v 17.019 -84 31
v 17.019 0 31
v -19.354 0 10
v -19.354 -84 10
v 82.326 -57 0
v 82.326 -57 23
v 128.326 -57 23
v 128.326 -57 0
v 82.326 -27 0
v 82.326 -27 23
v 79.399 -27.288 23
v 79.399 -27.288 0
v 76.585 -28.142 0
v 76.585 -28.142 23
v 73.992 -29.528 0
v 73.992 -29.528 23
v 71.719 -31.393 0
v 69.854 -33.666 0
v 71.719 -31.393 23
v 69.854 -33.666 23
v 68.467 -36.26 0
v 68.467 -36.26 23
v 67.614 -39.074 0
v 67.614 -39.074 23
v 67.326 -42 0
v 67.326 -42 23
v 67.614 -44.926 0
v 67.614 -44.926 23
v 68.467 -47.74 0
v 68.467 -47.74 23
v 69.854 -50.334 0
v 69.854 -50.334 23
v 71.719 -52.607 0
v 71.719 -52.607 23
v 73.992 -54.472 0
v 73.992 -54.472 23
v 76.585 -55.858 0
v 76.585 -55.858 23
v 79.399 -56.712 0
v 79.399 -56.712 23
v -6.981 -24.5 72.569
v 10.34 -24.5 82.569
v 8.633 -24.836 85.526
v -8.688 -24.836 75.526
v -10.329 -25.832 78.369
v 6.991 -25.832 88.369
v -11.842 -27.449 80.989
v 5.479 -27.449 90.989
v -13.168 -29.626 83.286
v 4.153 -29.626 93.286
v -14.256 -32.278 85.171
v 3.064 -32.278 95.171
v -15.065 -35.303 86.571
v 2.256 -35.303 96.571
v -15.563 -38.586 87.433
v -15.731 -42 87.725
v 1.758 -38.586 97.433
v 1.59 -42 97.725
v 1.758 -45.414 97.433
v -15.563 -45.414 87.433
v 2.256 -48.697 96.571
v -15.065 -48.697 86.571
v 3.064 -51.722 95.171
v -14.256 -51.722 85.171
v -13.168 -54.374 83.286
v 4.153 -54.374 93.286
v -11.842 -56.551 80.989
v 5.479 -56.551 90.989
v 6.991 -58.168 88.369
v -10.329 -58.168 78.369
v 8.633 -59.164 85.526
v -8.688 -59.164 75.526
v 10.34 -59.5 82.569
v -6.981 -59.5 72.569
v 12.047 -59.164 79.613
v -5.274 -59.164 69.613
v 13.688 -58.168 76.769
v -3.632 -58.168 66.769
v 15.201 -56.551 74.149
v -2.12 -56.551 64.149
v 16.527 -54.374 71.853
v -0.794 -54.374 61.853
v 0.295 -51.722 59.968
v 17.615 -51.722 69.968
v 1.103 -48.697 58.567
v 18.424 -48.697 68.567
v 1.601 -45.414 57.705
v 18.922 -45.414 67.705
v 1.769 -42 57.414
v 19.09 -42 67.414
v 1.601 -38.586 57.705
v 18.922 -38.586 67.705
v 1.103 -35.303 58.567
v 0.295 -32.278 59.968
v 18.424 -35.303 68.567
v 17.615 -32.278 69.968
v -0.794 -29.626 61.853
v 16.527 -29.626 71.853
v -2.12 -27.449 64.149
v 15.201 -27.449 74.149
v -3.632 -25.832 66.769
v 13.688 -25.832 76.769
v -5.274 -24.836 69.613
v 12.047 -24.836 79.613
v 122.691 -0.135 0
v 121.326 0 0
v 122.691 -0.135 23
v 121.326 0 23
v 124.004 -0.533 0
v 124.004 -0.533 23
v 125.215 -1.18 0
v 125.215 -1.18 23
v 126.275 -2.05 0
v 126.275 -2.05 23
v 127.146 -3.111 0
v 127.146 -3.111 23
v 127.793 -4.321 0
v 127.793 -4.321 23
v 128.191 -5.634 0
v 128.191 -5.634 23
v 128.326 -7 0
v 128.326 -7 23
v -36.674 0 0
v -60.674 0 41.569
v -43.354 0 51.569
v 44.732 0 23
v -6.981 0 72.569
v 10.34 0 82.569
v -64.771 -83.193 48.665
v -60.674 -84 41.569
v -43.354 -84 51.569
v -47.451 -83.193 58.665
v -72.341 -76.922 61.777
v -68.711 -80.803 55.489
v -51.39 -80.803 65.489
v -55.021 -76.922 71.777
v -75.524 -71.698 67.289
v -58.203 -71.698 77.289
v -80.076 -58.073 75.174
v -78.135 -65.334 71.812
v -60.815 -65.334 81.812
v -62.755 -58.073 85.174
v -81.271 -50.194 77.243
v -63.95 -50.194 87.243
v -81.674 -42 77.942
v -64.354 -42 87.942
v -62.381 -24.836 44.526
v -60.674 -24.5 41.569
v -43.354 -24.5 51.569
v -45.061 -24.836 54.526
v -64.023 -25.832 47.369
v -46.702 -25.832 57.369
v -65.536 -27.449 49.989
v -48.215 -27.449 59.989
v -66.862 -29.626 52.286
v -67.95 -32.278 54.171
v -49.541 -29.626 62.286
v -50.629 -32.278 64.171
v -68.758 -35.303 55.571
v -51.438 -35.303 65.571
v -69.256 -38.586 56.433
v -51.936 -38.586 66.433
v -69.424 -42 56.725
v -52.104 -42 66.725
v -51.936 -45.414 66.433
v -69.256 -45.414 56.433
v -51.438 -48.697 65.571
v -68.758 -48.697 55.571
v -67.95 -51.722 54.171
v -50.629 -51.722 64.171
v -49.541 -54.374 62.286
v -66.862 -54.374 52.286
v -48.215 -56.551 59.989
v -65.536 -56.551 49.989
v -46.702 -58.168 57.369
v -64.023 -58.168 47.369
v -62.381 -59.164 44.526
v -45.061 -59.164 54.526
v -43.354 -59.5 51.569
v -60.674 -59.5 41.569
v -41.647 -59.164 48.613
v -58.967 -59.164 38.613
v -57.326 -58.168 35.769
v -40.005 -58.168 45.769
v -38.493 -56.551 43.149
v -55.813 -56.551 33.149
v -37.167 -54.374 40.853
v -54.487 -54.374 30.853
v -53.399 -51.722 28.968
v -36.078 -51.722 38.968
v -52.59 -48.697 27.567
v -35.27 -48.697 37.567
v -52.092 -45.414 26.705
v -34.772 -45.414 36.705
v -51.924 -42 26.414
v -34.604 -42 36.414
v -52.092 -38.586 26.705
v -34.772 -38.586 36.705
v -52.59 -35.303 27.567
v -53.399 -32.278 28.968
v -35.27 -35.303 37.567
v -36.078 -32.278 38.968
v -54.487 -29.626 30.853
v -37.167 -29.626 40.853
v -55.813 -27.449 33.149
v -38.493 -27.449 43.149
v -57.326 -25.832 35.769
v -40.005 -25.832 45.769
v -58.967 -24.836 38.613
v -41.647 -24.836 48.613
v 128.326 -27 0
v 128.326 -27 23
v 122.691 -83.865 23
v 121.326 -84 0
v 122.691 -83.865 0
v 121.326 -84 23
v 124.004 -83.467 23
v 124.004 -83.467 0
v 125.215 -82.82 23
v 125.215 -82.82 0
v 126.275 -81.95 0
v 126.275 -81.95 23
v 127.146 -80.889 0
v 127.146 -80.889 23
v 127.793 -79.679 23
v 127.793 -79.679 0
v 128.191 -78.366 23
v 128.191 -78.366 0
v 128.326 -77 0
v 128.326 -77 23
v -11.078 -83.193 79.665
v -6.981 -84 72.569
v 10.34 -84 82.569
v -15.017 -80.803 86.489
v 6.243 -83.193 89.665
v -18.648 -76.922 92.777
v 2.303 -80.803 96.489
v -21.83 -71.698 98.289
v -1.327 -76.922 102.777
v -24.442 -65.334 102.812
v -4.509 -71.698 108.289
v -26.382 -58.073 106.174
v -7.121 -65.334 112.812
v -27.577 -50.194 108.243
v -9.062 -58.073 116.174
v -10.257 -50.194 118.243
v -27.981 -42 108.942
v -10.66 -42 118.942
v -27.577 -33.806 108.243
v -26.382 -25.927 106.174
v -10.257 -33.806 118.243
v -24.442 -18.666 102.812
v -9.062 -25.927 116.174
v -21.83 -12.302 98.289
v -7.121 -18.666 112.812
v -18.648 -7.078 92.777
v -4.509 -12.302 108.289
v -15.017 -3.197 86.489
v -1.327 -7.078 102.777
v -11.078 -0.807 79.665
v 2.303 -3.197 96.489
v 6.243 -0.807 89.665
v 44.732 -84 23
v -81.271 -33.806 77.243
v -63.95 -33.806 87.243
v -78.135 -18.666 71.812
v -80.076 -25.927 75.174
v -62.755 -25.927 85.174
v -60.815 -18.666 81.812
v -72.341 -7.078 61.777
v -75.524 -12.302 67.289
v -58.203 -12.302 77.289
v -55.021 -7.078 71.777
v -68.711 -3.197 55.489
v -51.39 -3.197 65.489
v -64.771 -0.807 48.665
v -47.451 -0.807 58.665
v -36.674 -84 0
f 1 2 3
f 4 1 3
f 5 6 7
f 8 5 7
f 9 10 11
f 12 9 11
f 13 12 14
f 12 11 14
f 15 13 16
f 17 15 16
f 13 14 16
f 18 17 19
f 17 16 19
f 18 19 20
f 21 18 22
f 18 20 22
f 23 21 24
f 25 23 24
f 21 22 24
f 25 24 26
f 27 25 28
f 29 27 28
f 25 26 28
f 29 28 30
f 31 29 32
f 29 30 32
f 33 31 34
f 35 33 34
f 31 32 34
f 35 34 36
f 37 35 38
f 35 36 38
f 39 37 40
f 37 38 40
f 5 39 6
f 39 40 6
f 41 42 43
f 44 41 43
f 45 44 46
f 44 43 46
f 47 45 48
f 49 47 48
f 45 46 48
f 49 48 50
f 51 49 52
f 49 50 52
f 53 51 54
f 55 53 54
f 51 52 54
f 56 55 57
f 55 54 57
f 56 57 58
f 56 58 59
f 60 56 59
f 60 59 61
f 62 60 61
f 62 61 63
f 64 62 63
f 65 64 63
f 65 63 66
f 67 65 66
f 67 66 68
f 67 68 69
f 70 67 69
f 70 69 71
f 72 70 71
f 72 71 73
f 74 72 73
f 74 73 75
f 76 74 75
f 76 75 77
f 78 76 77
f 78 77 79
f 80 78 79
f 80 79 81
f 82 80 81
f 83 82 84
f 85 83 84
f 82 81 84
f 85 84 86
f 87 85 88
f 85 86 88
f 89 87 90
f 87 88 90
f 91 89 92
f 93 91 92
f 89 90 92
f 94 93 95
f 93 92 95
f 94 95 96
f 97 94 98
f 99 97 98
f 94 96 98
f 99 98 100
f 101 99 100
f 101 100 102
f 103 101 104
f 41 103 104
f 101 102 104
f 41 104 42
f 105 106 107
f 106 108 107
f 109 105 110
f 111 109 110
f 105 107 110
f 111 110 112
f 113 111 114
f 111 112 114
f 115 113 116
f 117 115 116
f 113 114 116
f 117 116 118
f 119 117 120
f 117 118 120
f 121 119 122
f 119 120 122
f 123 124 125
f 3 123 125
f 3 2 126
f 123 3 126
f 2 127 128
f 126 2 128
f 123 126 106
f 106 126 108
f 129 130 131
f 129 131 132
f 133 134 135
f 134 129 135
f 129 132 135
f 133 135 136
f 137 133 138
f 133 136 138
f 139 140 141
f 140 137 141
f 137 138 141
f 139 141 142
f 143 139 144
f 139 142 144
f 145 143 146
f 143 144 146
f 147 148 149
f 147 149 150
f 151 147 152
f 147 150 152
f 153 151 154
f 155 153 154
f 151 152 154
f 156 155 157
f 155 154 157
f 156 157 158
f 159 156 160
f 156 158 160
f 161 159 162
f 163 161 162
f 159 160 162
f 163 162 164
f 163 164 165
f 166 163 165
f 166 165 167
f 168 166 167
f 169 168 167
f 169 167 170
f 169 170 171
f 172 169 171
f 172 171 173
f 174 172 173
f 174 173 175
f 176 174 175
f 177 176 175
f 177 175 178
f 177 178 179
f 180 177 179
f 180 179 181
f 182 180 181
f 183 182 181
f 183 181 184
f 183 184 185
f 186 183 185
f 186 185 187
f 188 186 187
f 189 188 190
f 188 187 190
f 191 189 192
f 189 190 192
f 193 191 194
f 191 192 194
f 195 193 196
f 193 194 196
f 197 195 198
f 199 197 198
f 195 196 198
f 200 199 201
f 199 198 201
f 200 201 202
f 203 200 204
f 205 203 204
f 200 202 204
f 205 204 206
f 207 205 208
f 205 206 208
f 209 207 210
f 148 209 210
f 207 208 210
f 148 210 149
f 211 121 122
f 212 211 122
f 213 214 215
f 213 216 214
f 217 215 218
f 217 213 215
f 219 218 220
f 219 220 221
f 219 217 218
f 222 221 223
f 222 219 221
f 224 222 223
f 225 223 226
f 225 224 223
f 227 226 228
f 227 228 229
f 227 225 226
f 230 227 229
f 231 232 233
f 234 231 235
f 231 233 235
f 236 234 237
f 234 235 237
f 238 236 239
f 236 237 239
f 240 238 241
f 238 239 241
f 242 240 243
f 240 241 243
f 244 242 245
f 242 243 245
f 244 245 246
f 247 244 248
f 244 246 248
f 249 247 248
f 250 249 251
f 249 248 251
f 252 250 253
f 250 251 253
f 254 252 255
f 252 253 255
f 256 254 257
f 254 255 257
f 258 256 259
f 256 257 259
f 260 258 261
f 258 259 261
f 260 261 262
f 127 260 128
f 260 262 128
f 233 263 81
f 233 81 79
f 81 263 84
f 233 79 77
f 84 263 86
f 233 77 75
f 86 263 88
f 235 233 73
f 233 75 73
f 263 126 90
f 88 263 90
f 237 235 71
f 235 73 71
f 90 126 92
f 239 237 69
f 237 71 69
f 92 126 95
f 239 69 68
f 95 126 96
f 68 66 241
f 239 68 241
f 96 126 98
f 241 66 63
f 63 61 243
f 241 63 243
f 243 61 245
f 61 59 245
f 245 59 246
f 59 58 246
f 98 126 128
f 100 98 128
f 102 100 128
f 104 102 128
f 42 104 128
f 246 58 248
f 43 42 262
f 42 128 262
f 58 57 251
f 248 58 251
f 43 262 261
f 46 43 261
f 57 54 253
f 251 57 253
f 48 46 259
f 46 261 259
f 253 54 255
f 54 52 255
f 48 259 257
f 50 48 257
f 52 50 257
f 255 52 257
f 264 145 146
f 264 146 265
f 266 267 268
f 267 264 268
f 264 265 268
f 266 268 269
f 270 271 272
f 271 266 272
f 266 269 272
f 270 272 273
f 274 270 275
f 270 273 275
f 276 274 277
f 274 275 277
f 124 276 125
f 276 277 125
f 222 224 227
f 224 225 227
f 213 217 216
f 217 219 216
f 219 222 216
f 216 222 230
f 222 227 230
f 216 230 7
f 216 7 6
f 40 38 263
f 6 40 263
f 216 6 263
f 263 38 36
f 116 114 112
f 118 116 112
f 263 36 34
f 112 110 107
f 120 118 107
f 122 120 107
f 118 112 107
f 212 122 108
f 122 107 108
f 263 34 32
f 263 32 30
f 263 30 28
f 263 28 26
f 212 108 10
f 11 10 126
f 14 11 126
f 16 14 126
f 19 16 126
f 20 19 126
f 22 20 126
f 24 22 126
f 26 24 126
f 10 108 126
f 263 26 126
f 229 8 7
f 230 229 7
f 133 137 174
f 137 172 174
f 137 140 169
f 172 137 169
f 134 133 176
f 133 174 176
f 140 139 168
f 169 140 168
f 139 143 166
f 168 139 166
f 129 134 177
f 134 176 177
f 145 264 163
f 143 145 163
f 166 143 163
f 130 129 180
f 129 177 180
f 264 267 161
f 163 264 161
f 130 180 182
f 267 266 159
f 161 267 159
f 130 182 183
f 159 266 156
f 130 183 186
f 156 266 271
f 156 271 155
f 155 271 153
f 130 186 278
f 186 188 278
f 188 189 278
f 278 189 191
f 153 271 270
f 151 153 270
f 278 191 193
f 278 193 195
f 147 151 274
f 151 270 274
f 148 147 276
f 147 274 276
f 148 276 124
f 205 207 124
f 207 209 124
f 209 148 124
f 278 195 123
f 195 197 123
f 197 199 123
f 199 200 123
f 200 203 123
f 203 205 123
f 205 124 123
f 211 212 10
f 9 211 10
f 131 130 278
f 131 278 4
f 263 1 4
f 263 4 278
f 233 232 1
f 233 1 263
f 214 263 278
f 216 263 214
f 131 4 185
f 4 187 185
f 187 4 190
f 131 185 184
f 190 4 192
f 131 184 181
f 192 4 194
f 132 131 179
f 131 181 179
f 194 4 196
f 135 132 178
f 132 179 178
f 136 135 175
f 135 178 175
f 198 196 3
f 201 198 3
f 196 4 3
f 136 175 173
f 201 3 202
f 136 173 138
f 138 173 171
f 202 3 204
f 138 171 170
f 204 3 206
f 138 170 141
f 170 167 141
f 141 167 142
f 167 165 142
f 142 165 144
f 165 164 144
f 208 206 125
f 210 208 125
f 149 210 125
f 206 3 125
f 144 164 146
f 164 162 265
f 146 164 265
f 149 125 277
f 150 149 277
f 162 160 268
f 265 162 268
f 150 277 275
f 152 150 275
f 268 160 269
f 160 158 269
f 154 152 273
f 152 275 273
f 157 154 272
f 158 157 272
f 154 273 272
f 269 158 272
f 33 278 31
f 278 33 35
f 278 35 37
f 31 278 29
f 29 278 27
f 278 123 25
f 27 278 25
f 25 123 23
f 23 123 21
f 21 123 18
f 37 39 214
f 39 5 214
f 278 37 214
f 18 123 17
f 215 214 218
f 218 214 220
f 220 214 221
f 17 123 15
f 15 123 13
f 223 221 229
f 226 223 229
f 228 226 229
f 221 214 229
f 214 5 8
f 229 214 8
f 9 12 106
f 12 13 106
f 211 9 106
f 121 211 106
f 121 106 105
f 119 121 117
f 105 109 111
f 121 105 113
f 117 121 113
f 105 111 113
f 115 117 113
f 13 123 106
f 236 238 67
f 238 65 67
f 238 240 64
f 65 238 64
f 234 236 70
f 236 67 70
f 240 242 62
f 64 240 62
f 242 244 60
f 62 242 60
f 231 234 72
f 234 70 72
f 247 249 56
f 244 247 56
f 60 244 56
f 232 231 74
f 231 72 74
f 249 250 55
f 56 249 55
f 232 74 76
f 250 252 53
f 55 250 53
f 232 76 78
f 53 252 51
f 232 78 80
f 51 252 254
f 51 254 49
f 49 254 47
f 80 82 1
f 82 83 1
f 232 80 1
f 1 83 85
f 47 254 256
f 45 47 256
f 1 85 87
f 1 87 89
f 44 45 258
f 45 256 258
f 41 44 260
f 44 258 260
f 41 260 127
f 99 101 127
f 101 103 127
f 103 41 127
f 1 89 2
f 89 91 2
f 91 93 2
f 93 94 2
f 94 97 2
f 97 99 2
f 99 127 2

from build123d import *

# Parameters (mm, degrees)
F1_DEPTH = 84
F3_DEPTH = 25
F4_R     = 7
F5_R     = 17.5
F6_DEPTH = 100


with BuildPart() as f1:
    # F0 (on Front) → F1 (new body)
    with BuildSketch(Plane.XZ):
        Polygon((-81.6743281484, 77.9422863406), (-36.6743281484, 0), (128.3256718516, 0), (128.3256718516, 23), (82.3256718516, 23), (44.7320598074, 23), (34.339754962, 41), (-10.660245038, 118.9422863406), (-27.9807531137, 108.9422863406), (17.0192468863, 31), (-19.3538200727, 10), (-64.3538200727, 87.9422863406), align=None)
    extrude(amount=F1_DEPTH)

    # F2 (on face) → F3 (cut)
    with BuildSketch(Plane.XY.offset(23)):
        with BuildLine():
            Line((128.3256718516, -27), (82.3256718516, -27))
            ThreePointArc((82.3256718516, -27), (67.3256718516, -42), (82.3256718516, -57))
            Line((82.3256718516, -57), (128.3256718516, -57))
            Line((128.3256718516, -57), (128.3256718516, -27))
        make_face()
    extrude(amount=-F3_DEPTH, mode=Mode.SUBTRACT)

    # F4
    f4_edges = [f1.edges().sort_by_distance(p)[0] for p in [
        (128.325672, 0, 11.5),
        (128.325672, -84, 11.5),
    ]]
    fillet(f4_edges, radius=F4_R)

    # F5 (on face) → F6 (cut)
    with BuildSketch(Plane(origin=(43.5083369991, 0, 25.1195500784), x_dir=(0, 1, 0), z_dir=(0.8660254038, 0, 0.5))):
        with Locations((-42, 66.3371640742)):
            Circle(F5_R)
        with BuildLine():
            ThreePointArc((-84, 66.3371640742), (-71.6984848098, 96.035648884), (-42, 108.3371640742))
            Line((-42, 108.3371640742), (-84, 108.3371640742))
            Line((-84, 108.3371640742), (-84, 66.3371640742))
        make_face()
        with BuildLine():
            ThreePointArc((-42, 108.3371640742), (-12.3015151902, 96.035648884), (0, 66.3371640742))
            Line((0, 66.3371640742), (0, 108.3371640742))
            Line((0, 108.3371640742), (-42, 108.3371640742))
        make_face()
    extrude(amount=-F6_DEPTH, mode=Mode.SUBTRACT)


solid = f1.part
